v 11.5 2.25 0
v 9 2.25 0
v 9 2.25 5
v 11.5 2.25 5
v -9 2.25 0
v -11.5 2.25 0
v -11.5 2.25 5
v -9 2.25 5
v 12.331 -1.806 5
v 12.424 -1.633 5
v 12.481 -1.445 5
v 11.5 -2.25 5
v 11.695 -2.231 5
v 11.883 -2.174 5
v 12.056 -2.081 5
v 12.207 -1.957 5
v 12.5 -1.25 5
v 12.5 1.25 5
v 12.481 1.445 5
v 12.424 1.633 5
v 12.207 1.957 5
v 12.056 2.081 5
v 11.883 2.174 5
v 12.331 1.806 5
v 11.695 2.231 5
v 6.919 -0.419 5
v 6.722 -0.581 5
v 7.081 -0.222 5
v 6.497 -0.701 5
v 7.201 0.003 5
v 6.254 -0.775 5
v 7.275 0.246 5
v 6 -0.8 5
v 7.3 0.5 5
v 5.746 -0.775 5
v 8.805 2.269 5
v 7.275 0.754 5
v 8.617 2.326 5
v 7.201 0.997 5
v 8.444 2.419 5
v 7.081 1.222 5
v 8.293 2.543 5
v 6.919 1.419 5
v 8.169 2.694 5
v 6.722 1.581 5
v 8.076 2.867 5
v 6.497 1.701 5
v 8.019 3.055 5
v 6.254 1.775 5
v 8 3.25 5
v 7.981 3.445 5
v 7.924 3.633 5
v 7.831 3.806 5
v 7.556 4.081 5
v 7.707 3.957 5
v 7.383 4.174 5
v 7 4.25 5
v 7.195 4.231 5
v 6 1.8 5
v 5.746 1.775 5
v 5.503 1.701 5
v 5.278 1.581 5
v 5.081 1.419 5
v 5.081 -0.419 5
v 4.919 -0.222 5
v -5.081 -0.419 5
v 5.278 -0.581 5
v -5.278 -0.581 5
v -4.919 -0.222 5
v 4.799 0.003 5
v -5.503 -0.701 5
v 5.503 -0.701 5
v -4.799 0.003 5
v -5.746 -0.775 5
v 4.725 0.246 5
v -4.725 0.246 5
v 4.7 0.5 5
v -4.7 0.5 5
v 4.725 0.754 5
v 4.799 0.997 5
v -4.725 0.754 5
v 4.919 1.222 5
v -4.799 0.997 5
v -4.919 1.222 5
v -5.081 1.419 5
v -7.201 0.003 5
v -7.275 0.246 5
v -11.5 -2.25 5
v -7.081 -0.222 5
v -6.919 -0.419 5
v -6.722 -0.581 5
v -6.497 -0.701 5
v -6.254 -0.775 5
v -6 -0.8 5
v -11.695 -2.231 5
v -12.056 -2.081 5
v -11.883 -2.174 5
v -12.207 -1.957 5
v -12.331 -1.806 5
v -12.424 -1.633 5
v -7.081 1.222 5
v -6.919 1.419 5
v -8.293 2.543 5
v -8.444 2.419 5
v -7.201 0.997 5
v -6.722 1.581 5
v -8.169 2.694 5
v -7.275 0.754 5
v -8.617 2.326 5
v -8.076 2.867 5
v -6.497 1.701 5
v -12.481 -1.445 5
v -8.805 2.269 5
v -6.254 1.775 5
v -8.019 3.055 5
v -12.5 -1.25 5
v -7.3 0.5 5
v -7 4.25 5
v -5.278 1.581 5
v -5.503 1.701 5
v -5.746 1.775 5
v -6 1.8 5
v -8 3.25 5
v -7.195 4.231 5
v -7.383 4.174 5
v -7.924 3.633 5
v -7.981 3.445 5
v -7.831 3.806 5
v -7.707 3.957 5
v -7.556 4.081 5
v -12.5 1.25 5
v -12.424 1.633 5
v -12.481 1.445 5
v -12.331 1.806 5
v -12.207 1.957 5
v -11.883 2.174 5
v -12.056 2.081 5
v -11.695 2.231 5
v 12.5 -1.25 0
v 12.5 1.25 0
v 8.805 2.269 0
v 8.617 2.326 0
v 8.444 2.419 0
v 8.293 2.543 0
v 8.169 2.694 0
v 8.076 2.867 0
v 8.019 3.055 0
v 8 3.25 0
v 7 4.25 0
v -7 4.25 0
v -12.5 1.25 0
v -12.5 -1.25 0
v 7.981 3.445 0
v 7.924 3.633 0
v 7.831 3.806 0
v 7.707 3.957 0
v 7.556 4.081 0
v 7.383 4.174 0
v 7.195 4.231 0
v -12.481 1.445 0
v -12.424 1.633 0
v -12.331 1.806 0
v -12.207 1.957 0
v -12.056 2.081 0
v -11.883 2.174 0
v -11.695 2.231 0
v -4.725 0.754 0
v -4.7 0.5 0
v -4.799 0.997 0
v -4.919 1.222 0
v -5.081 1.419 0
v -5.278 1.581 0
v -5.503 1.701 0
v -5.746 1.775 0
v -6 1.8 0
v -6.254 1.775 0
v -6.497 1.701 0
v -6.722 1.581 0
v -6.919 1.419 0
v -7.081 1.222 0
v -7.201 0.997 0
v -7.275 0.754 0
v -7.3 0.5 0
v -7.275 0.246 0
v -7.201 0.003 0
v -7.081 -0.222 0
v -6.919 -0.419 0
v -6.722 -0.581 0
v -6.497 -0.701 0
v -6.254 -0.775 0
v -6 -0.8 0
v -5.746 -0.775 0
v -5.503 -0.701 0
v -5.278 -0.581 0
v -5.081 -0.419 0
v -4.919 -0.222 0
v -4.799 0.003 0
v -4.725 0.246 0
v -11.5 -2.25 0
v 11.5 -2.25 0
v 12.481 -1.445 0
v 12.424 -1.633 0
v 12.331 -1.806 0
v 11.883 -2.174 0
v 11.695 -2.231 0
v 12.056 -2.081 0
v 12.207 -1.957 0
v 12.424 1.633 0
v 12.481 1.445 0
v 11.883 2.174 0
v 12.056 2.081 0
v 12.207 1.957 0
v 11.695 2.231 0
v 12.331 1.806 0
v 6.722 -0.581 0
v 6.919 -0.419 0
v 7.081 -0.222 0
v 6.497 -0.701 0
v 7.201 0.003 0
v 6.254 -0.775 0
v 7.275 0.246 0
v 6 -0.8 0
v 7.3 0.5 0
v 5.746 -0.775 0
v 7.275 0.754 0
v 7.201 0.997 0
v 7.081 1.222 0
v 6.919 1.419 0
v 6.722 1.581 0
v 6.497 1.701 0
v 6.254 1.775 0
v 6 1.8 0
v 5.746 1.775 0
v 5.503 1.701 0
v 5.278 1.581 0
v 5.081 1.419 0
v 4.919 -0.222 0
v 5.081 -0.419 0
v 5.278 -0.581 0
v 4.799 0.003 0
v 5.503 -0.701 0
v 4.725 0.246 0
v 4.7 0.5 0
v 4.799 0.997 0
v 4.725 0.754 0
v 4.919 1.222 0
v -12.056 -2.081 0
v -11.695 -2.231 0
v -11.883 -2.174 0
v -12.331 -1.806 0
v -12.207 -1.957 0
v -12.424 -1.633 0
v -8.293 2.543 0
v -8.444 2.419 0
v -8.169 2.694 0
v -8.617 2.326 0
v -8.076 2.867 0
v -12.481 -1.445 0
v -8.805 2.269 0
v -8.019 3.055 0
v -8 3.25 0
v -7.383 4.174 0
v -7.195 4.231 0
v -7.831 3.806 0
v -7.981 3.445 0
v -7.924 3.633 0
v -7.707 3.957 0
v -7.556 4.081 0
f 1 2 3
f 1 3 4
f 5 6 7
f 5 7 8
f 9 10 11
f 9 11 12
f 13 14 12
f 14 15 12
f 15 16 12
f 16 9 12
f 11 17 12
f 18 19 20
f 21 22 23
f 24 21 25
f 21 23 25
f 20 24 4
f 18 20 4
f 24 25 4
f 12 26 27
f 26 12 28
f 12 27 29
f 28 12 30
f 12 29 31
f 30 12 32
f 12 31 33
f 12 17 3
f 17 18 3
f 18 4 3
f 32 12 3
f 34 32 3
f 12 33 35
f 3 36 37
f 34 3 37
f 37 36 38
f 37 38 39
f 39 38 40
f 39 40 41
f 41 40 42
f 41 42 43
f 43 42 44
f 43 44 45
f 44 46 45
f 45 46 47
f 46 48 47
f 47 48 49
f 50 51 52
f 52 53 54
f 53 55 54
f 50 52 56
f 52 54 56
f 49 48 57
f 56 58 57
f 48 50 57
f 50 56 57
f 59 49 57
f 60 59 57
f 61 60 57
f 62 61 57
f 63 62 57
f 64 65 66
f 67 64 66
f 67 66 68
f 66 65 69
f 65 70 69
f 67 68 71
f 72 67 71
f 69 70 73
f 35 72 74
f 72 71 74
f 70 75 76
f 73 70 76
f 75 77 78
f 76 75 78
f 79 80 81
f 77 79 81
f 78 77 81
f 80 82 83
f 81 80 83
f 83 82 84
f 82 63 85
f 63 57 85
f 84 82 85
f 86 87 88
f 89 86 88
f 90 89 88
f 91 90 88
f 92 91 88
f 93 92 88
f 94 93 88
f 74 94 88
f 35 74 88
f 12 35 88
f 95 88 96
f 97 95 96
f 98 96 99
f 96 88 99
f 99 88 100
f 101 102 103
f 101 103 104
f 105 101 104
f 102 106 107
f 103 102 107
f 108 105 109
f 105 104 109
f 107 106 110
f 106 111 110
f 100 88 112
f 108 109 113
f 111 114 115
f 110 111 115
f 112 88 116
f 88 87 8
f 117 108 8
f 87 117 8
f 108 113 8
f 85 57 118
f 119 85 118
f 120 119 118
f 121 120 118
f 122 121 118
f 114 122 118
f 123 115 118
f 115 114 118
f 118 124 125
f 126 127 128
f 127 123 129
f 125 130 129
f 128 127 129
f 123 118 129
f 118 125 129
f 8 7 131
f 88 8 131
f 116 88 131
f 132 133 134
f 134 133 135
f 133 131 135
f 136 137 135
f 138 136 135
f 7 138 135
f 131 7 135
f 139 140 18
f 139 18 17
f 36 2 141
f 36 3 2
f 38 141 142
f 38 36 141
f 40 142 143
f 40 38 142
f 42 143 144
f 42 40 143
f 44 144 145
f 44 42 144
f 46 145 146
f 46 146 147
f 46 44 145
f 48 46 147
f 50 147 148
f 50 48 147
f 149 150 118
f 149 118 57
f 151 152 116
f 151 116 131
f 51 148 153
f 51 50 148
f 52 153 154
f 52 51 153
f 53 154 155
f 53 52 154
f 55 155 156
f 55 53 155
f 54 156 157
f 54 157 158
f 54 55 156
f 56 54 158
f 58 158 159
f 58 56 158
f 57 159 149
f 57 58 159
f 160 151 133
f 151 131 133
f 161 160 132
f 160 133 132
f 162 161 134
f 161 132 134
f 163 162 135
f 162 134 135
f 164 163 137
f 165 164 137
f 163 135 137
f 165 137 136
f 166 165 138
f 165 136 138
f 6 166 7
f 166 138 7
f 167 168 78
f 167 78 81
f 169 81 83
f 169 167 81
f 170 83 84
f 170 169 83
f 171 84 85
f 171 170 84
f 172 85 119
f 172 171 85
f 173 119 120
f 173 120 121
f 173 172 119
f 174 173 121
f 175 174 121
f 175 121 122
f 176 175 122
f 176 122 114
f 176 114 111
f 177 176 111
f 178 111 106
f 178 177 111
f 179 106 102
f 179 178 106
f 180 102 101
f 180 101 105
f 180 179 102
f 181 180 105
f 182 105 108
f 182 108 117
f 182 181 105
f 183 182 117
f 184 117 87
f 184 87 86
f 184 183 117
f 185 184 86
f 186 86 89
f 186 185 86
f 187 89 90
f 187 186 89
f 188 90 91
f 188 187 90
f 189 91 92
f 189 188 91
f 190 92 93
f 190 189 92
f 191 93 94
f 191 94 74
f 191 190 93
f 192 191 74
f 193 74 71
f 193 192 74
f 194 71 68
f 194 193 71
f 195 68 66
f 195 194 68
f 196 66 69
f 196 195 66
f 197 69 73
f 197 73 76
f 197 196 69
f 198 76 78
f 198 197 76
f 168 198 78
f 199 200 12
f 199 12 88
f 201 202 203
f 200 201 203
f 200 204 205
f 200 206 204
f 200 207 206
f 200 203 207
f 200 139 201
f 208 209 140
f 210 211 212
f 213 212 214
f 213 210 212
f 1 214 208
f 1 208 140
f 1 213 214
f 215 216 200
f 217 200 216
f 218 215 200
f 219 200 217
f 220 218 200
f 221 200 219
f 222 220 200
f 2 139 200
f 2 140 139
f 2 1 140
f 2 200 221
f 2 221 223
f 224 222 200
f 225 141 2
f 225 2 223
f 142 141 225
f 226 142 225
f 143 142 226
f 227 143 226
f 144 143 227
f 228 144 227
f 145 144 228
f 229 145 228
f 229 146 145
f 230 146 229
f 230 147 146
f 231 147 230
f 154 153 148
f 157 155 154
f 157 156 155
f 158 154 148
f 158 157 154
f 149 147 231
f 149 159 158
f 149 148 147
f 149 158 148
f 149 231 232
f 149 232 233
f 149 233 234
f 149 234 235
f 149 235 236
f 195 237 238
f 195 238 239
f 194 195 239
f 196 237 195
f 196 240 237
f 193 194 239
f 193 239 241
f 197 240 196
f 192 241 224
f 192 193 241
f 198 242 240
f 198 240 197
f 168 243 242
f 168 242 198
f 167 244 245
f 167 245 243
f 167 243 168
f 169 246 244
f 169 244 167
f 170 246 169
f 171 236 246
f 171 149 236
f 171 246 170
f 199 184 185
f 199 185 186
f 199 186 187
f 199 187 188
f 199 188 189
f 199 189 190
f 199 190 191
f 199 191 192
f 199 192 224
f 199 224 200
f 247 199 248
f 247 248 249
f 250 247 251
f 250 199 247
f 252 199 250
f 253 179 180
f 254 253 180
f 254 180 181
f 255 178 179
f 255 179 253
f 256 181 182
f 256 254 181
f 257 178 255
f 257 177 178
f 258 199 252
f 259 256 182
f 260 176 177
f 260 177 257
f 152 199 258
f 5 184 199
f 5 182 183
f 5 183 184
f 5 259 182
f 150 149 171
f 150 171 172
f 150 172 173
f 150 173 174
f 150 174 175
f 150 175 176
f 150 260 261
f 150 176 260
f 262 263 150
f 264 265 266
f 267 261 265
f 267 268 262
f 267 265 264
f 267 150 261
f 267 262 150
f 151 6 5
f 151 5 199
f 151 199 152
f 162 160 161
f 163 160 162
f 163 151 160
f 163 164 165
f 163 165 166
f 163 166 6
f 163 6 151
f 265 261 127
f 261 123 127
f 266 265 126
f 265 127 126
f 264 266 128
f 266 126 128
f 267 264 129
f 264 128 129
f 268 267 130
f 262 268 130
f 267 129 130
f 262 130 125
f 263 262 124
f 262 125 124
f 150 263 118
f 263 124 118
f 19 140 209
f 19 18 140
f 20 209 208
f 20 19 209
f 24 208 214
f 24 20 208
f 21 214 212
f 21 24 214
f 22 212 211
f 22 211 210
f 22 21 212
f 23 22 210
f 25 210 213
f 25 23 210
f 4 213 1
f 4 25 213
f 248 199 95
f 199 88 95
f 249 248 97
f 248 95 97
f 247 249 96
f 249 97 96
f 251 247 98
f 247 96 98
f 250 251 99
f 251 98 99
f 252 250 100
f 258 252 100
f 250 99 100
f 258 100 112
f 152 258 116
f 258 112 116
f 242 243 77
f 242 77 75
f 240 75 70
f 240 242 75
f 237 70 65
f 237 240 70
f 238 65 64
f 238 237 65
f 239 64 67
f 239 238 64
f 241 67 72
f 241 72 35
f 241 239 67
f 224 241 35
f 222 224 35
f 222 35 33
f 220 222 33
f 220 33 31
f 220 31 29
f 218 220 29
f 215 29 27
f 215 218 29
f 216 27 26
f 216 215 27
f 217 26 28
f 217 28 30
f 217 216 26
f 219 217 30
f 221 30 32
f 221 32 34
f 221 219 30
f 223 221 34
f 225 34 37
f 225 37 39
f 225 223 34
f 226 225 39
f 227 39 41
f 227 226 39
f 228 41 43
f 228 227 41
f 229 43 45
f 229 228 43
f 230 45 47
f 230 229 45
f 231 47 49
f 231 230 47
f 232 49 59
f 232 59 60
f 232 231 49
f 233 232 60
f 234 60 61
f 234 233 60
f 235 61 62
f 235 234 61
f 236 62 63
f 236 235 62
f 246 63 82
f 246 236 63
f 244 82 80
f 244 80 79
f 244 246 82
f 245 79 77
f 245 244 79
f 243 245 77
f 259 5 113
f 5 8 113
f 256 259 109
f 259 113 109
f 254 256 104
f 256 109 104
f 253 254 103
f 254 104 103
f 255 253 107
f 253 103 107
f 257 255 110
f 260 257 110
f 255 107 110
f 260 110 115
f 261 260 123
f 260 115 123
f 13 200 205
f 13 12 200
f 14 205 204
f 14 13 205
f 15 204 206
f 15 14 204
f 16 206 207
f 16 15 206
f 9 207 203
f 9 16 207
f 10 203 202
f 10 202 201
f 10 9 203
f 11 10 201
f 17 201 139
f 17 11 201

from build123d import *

# Parameters (mm, degrees)
SKETCH_1_R      = 1.3
EXTRUDE_1_DEPTH = 5
FILLET_1_R      = 1


with BuildPart() as part:
    # 草图1 → 凸台-拉伸1 (new body)
    with BuildSketch(Plane.XY):
        Polygon((12.5, -2.25), (-12.5, -2.25), (-12.5, 2.25), (-8, 2.25), (-8, 4.25), (8, 4.25), (8, 2.25), (12.5, 2.25), align=None)
        with Locations((-6, 0.5)):
            Circle(SKETCH_1_R, mode=Mode.SUBTRACT)
        with Locations(Location((6, 0.5, 0), (0, 0, 180))):
            Circle(SKETCH_1_R, mode=Mode.SUBTRACT)
    extrude(amount=EXTRUDE_1_DEPTH)

    # 圆角1
    fillet_1_edges = [part.edges().sort_by_distance(p)[0] for p in [
        (12.5, -2.25, 2.5),
        (12.5, 2.25, 2.5),
        (-12.5, -2.25, 2.5),
        (-12.5, 2.25, 2.5),
        (-8, 4.25, 2.5),
        (8, 4.25, 2.5),
        (8, 2.25, 2.5),
        (-8, 2.25, 2.5),
    ]]
    fillet(fillet_1_edges, radius=FILLET_1_R - 0.0001)  # a hair under: the kernel refuses the full size


solid = part.part
